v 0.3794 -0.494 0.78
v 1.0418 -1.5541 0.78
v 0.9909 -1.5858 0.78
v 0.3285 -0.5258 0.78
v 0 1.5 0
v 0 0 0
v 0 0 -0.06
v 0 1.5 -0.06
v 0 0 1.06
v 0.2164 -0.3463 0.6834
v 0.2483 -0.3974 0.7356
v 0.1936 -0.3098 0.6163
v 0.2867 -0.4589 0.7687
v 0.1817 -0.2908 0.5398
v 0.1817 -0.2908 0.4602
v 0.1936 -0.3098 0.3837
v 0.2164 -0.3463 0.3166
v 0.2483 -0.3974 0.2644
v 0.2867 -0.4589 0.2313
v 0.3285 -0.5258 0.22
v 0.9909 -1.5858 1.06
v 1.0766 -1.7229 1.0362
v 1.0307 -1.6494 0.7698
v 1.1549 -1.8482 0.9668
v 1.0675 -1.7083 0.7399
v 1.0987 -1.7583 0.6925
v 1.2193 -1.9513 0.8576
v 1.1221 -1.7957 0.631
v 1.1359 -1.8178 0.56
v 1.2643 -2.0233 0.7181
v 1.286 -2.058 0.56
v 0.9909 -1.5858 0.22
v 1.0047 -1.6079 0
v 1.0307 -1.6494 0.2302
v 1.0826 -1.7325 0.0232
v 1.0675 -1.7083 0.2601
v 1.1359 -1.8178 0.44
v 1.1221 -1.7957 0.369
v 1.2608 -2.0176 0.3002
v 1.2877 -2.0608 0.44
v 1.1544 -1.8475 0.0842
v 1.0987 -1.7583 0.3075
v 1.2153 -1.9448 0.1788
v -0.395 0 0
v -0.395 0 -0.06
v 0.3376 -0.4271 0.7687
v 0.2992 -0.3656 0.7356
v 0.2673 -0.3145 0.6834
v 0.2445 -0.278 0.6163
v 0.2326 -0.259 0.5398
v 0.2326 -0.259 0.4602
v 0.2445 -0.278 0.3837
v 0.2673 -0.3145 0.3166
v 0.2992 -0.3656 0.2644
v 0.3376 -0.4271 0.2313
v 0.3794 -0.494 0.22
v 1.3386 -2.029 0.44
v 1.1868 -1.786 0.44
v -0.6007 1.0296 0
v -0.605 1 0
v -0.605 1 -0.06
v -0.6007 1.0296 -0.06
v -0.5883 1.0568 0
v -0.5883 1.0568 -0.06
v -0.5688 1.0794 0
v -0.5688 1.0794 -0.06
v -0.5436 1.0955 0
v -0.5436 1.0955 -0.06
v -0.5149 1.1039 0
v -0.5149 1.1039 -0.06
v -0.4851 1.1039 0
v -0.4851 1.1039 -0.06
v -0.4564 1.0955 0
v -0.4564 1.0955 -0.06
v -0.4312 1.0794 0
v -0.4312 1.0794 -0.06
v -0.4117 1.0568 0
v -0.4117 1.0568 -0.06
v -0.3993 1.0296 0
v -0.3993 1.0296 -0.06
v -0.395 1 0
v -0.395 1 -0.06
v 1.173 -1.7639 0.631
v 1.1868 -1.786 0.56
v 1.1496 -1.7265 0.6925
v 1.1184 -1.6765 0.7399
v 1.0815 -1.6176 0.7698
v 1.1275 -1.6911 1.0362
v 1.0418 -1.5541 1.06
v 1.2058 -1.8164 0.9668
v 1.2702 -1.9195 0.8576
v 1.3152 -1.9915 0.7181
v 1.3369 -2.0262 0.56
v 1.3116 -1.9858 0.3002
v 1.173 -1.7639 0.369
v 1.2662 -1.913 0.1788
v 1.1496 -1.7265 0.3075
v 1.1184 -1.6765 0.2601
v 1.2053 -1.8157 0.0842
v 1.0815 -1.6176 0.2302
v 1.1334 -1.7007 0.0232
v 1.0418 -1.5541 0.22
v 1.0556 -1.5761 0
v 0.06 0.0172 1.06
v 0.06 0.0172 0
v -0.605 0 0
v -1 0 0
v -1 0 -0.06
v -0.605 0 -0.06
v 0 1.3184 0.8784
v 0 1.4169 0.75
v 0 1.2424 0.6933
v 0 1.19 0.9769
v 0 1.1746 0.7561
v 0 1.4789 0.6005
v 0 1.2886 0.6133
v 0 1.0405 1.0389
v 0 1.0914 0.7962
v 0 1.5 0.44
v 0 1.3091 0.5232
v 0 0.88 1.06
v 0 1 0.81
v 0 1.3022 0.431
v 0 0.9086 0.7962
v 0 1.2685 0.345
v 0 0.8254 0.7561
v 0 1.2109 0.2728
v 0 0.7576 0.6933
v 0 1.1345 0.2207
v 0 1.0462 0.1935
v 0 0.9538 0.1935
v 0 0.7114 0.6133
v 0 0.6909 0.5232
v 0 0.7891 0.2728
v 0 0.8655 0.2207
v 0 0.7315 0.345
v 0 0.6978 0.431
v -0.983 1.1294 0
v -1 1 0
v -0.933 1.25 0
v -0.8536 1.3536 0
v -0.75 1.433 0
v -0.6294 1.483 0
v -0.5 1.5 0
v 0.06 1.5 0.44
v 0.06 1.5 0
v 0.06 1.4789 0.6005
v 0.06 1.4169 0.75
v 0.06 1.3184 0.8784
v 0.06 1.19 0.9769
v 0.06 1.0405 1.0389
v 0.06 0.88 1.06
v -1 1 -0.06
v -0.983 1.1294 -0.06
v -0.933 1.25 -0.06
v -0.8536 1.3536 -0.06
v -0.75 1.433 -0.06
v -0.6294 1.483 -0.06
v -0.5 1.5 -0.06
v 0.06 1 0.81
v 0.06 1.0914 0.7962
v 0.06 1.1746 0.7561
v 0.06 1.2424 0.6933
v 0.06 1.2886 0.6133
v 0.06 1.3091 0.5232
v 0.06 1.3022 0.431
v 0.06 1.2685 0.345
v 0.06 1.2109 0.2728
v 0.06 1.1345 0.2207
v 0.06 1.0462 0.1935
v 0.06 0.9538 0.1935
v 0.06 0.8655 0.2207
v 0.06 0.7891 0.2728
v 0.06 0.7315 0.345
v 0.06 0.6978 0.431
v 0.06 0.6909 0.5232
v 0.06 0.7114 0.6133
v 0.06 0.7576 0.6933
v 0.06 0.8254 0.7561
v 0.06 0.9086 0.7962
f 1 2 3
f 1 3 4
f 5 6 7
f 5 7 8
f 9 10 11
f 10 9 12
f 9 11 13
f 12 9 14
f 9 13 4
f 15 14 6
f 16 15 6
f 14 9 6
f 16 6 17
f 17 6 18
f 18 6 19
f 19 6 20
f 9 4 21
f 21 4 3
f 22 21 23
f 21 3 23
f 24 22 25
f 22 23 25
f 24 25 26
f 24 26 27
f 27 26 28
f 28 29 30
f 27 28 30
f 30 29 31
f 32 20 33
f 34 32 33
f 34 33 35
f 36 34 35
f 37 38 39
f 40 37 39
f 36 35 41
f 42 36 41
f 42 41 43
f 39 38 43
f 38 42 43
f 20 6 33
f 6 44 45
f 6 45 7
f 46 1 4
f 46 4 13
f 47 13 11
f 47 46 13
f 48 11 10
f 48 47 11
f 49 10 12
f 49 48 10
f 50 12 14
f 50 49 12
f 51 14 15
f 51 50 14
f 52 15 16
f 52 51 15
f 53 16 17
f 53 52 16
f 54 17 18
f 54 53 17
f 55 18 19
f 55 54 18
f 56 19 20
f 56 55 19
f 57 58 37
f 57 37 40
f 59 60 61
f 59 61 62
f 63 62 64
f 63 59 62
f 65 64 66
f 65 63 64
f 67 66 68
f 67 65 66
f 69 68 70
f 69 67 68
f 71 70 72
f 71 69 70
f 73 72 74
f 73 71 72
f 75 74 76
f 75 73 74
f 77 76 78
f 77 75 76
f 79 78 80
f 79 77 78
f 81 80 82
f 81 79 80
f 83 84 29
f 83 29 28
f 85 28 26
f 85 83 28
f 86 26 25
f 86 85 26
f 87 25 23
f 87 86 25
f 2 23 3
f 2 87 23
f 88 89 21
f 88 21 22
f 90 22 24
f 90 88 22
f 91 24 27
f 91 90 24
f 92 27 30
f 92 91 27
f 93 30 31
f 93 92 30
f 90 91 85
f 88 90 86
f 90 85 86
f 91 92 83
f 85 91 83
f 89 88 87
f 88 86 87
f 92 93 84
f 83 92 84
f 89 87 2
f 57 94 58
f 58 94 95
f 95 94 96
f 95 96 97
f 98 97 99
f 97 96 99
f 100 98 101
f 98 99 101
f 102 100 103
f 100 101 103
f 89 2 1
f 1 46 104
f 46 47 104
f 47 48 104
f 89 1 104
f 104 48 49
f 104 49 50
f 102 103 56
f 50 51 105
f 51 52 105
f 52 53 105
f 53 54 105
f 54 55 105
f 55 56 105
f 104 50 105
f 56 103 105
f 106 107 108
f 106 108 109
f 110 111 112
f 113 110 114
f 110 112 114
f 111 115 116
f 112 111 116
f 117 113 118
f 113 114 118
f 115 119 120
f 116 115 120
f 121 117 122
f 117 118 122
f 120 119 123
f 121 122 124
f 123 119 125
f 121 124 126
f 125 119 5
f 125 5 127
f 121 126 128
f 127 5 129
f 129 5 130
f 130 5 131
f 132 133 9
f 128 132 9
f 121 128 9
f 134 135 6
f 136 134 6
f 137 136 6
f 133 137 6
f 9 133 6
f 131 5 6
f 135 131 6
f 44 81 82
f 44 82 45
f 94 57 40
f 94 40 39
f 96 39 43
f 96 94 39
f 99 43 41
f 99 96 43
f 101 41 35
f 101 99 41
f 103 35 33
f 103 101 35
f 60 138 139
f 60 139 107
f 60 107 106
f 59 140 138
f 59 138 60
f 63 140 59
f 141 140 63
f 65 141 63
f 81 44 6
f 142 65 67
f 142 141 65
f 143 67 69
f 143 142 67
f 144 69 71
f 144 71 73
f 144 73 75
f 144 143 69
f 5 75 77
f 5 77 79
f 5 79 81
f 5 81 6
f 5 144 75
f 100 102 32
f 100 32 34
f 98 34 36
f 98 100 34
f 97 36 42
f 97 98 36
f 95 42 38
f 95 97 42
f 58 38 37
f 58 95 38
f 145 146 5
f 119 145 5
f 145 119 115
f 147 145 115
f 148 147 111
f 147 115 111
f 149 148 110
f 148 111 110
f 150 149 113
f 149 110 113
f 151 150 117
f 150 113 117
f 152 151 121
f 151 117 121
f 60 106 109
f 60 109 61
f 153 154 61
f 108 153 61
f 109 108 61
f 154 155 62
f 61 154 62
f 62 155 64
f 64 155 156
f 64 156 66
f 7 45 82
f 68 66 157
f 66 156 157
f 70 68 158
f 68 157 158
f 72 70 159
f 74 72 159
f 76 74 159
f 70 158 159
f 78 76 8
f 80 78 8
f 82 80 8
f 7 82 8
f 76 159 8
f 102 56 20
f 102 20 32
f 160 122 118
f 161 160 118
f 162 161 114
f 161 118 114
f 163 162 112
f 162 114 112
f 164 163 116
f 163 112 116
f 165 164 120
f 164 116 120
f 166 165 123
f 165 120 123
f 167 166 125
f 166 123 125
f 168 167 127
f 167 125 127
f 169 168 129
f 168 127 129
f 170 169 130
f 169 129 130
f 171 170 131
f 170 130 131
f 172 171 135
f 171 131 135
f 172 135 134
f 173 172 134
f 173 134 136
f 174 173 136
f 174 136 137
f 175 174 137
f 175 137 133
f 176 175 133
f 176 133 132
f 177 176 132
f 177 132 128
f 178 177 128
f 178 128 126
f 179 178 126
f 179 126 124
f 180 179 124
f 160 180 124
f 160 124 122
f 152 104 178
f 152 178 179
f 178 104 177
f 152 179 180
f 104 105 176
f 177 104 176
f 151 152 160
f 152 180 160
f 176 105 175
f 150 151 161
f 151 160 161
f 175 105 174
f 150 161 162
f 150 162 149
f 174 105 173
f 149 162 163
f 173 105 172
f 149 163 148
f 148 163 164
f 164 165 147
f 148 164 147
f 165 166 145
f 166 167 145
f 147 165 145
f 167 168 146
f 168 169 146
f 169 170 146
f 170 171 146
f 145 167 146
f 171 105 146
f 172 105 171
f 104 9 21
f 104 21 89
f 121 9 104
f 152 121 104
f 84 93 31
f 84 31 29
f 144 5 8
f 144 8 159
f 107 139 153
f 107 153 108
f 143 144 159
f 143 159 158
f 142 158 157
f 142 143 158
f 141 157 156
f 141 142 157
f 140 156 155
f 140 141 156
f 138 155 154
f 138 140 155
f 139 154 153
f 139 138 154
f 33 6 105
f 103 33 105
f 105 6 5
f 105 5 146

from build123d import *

# Parameters (mm, degrees)
BOSS_EXTRUDE1_DEPTH = 0.06
EXTRUDE_THIN2_DEPTH = 1.06
SKETCH4_R           = 0.31
CUT_EXTRUDE1_DEPTH  = 3.676216217
CUT_EXTRUDE2_DEPTH  = 3.676216217
CUT_EXTRUDE3_START  = -0.06
CUT_EXTRUDE3_DEPTH  = 0.06


# Read off the part's stored shape, not the designer's step: Cut-Extrude3
with BuildPart() as part:
    # Sketch2 → Boss-Extrude1 (new body)
    with BuildSketch(Plane.XY):
        with BuildLine():
            Line((0, 0), (0, 1.5))
            Line((0, 1.5), (-0.5, 1.5))
            ThreePointArc((-0.5, 1.5), (-0.853553391, 1.353553391), (-1, 1))
            Line((-1, 1), (-1, 0))
            Line((-1, 0), (-0.605, 0))
            Line((-0.605, 0), (-0.605, 1))
            ThreePointArc((-0.605, 1), (-0.5, 1.105), (-0.395, 1))
            Line((-0.395, 1), (-0.395, 0))
            Line((-0.395, 0), (0, 0))
        make_face()
    extrude(amount=-BOSS_EXTRUDE1_DEPTH)


with BuildPart() as body_2:
    # Sketch3 → Extrude-Thin2 (new body)
    with BuildSketch(Plane.XY):
        Polygon((0, 1.5), (0, 0), (1.287703812, -2.060756874), (1.338586698, -2.028961718), (0.06, 0.017204723), (0.06, 1.5), align=None)
    extrude(amount=EXTRUDE_THIN2_DEPTH)

    # Sketch4 → Cut-Extrude1 (cut, through all)
    with BuildSketch(Plane.ZY):
        with Locations((0.5, 1)):
            Circle(SKETCH4_R)
    extrude(amount=-CUT_EXTRUDE1_DEPTH, mode=Mode.SUBTRACT)

    # Sketch4<3> → Cut-Extrude2 (cut, through all)
    with BuildSketch(Plane.ZY):
        with BuildLine():
            ThreePointArc((0.44, 1.5), (0.878406204, 1.318406204), (1.06, 0.88))
            Line((1.06, 0.88), (1.06, 1.5))
            Line((1.06, 1.5), (0.44, 1.5))
        make_face()
    extrude(amount=-CUT_EXTRUDE2_DEPTH, mode=Mode.SUBTRACT)

    # Cut-Extrude3 outline → Cut-Extrude3 (cut)
    with BuildSketch(Plane(origin=(0, 0, 0), x_dir=(0, 0, 1), z_dir=(-0.8480480961564291, -0.5299192642332001, 0)).offset(CUT_EXTRUDE3_START)):
        with BuildLine():
            Line((0.44, -2.143495887), (0.44, -2.43))
            Line((0.44, -2.43), (1.06, -2.43))
            Line((1.06, -2.43), (1.06, -1.87))
            ThreePointArc((1.06, -1.87), (0.916653333, -2.244165739), (0.56, -2.426776436))
            Line((0.56, -2.426776436), (0.56, -2.143495887))
            ThreePointArc((0.56, -2.143495887), (0.718174242, -2.045499288), (0.78, -1.87))
            Line((0.78, -1.87), (0.78, -0.62))
            ThreePointArc((0.78, -0.62), (0.5, -0.34), (0.22, -0.62))
            Line((0.22, -0.62), (0.22, -1.87))
            ThreePointArc((0.22, -1.87), (0.281825758, -2.045499288), (0.44, -2.143495887))
        make_face()
        with BuildLine():
            ThreePointArc((0.44, -2.43), (0.127646005, -2.239065143), (0, -1.895950533))
            Line((0, -1.895950533), (0, -2.43))
            Line((0, -2.43), (0.44, -2.43))
        make_face()
    extrude(amount=CUT_EXTRUDE3_DEPTH, mode=Mode.SUBTRACT)


solid = Compound([part.part, body_2.part])
